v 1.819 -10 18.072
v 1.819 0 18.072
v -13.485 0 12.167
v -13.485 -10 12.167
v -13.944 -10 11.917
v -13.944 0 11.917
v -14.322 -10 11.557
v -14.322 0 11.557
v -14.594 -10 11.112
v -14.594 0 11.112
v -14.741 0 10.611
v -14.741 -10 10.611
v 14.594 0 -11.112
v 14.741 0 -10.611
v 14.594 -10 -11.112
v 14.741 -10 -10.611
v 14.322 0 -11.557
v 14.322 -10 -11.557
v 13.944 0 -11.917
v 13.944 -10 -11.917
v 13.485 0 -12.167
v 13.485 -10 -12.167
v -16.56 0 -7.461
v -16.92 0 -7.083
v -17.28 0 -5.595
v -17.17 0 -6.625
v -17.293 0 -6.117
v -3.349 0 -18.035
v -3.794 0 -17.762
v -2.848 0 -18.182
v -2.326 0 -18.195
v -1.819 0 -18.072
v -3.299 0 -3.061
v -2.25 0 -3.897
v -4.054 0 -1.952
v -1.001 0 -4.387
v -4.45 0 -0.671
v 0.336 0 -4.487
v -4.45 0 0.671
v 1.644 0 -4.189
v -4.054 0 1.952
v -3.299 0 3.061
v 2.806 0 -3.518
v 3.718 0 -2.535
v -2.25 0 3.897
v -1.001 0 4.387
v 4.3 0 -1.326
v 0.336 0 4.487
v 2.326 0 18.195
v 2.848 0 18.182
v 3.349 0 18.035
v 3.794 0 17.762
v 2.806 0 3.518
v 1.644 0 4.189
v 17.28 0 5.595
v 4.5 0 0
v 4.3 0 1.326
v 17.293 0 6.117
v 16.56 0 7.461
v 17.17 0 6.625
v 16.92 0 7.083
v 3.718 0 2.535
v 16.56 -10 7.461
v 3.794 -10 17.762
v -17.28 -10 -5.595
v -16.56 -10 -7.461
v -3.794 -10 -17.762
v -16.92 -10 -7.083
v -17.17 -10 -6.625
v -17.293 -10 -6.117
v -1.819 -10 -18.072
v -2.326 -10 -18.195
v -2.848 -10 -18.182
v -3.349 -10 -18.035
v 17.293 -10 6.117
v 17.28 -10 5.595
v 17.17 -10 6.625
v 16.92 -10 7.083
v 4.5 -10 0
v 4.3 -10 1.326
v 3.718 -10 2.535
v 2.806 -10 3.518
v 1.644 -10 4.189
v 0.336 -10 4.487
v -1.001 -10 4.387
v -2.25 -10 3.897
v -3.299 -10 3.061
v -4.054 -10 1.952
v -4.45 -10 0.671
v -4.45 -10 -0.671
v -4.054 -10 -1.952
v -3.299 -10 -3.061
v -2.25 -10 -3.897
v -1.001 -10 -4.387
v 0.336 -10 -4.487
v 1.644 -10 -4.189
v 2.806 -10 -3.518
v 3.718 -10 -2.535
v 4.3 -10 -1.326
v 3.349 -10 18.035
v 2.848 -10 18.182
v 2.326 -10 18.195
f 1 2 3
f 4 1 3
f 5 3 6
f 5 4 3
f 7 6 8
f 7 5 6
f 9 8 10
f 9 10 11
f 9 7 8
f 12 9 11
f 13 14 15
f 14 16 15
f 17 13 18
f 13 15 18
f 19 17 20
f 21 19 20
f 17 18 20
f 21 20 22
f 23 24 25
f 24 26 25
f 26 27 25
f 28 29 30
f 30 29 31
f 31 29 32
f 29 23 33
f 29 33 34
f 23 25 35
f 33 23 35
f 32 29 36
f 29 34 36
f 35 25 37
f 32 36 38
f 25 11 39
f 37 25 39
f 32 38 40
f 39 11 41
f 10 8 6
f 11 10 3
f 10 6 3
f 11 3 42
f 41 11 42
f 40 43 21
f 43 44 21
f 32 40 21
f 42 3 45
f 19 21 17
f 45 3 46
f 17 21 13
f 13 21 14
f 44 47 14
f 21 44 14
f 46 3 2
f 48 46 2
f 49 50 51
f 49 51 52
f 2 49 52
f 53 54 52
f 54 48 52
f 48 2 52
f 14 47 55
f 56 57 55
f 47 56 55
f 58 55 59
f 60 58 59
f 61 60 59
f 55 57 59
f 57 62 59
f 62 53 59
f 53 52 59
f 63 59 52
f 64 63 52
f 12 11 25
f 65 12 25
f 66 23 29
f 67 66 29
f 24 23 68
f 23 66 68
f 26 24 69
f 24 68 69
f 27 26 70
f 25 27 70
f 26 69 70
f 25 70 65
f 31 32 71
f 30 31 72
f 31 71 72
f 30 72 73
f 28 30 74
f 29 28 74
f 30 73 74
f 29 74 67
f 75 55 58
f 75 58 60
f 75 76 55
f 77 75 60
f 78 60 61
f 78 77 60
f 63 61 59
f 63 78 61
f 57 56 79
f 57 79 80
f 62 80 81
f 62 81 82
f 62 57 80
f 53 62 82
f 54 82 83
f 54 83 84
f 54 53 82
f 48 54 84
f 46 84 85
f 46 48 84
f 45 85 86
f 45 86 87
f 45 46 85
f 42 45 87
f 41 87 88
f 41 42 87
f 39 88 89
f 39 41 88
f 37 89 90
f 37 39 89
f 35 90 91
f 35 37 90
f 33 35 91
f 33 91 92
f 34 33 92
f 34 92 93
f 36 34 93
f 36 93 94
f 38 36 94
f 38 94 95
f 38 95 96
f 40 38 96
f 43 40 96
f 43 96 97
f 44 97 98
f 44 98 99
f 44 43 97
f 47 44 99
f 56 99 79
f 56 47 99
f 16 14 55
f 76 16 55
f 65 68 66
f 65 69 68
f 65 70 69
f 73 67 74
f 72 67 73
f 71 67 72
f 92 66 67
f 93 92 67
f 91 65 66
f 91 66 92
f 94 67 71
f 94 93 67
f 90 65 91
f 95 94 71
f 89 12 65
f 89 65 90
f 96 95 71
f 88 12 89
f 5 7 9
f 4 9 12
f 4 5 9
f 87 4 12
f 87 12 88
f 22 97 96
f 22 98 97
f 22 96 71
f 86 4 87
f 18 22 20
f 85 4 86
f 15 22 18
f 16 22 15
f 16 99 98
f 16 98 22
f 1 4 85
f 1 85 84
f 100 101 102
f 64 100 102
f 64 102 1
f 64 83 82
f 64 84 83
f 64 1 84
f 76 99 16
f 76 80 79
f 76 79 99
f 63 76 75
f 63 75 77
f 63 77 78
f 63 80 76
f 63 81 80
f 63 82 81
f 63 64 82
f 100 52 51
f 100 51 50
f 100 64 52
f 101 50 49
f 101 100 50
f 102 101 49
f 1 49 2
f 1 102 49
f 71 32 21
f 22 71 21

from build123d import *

# Parameters (mm, degrees)
F0_R     = 4.5
F1_DEPTH = 10
F2_R     = 2


with BuildPart() as f1:
    # F0 (on Front) → F1 (new body)
    with BuildSketch(Plane.XZ):
        Polygon((14.562795, -11.751718), (17.458684, 6.735892), (2.895889, 18.48761), (-14.562795, 11.751718), (-17.458684, -6.735892), (-2.895889, -18.48761), align=None)
        Circle(F0_R, mode=Mode.SUBTRACT)
    extrude(amount=F1_DEPTH)

    # F2
    f2_edges = [f1.edges().sort_by_distance(p)[0] for p in [
        (2.895889, -5, 18.48761),
        (17.458684, -5, 6.735892),
        (14.562795, -5, -11.751718),
        (-2.895889, -5, -18.48761),
        (-17.458684, -5, -6.735892),
        (-14.562795, -5, 11.751718),
    ]]
    fillet(f2_edges, radius=F2_R)


solid = f1.part
